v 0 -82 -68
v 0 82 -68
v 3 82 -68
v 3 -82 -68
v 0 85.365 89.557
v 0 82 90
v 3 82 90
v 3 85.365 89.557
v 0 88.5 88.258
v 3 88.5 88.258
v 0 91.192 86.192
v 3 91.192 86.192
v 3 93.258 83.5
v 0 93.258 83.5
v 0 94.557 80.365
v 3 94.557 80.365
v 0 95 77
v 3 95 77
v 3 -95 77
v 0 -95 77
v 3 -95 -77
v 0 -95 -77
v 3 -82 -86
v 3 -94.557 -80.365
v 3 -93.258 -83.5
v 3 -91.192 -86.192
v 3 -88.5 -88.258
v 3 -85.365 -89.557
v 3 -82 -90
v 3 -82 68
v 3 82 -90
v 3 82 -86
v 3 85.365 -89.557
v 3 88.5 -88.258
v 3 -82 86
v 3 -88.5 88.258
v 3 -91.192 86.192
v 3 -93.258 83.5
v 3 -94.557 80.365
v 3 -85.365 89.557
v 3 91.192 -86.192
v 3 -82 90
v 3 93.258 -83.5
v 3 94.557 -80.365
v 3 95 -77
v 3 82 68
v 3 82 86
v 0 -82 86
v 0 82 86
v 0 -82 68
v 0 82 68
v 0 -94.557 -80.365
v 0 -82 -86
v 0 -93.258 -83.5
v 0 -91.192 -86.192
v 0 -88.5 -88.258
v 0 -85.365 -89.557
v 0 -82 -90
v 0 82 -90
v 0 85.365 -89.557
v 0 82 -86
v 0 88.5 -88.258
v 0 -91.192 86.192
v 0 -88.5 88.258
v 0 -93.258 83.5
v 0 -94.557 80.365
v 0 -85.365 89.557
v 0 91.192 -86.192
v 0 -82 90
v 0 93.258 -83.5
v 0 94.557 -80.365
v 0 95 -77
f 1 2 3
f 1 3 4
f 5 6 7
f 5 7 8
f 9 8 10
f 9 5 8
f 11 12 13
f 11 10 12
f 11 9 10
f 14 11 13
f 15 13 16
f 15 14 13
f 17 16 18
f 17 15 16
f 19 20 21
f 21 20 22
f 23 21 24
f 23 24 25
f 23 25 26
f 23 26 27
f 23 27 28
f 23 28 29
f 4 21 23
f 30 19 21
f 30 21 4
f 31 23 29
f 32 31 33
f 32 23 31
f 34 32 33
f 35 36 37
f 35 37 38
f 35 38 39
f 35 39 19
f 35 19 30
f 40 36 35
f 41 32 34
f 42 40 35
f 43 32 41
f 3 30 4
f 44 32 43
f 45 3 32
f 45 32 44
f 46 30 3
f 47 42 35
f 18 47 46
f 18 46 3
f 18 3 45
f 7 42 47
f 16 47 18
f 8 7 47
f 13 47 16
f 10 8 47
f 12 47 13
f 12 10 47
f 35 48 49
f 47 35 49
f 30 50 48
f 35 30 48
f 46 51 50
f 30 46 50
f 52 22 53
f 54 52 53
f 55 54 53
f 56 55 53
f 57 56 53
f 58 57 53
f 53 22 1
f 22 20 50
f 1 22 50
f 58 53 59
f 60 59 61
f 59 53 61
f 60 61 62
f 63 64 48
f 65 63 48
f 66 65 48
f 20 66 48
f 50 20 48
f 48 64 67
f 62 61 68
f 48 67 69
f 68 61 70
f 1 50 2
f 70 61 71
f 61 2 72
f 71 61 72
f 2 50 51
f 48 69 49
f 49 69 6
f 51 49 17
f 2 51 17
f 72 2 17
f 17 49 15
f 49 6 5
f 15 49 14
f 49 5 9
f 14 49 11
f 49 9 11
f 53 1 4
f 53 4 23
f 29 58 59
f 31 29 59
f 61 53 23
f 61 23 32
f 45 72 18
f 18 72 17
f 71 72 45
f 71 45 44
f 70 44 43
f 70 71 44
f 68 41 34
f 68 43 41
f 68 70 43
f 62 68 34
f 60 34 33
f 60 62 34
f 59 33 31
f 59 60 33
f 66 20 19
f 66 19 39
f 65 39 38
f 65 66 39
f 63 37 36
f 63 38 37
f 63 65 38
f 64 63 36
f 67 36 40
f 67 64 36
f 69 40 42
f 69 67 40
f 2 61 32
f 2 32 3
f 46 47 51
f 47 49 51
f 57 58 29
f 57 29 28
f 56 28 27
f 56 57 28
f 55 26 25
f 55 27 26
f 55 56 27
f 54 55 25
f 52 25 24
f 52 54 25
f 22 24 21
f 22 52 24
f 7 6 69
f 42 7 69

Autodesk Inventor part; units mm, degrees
ref_plane "YZ Plane" through (0, 0, 0) normal (1, 0, 0) x (0, 1, 0)
sketch "Эскиз1" plane through (0, 0, 0) normal (1, 0, 0) x (0, 1, 0)
  line L0 (95, -77) -> (95, 77)
  line L1 (82, 90) -> (-82, 90)
  line L2 (-95, 77) -> (-95, -77)
  line L3 (-82, -90) -> (82, -90)
  arc A0 (82, -90) -> (95, -77) centre (82, -77) ccw
  arc A1 (-95, -77) -> (-82, -90) centre (-82, -77) ccw
  arc A2 (-82, 90) -> (-95, 77) centre (-82, 77) ccw
  arc A3 (95, 77) -> (82, 90) centre (82, 77) ccw
  line L4 (-82, 90) -> (82, 90)
  line L5 (82, 68) -> (-82, 68)
  line L6 (-82, 68) -> (-82, 86)
  line L7 (-82, 86) -> (82, 86)
  line L8 (-82, -90) -> (82, -90)
  line L9 (82, -86) -> (82, -68)
  line L10 (82, -68) -> (-82, -68)
  line L11 (-82, -68) -> (-82, -86)
  line L12 (-82, -86) -> (82, -86)
  line L13 (82, 86) -> (82, 68)
  line L14 (82, 68) -> (72, 68)
  line L15 (72, 86) -> (82, 86)
  line L16 (-82, 68) -> (-72, 68)
  line L17 (-72, 68) -> (-72, 86)
  line L18 (-72, 86) -> (-82, 86)
  line L19 (-82, 86) -> (-82, 68)
  line L20 (-72, 86) -> (-68.8341, 86)
  line L21 (-68.8341, 86) -> (-68.8341, 84.5)
  line L22 (-68.8341, 84.5) -> (-72, 84.5)
  line L23 (-72, 84.5) -> (-72, 86)
  line L24 (-72, 84.5) -> (-12, 84.5)
  line L25 (-12, 84.5) -> (-12, 69.5)
  line L26 (-12, 69.5) -> (-72, 69.5)
  line L27 (-72, 69.5) -> (-72, 84.5)
  line L28 (82, 86) -> (72, 86)
  line L29 (72, 86) -> (72, 68)
  line L30 (72, 68) -> (82, 68)
  line L31 (82, 68) -> (82, 86)
  line L32 (72, 84.5) -> (12, 84.5)
  line L33 (12, 84.5) -> (12, 69.5)
  line L34 (12, 69.5) -> (72, 69.5)
  line L35 (72, 69.5) -> (72, 84.5)
  line L36 (-42, 68) -> (-54.5, 68)
  line L37 (-54.5, 8) -> (-29.5, 8)
  line L38 (-29.5, 8) -> (-29.5, 68)
  line L39 (-29.5, 68) -> (-54.5, 68)
  line L40 (-54.5, 68) -> (-54.5, 8)
  point P0 (0, 0)
  point P1 (-95, 90)
  point P2 (95, 90)
  point P3 (-95, -90)
  dimension "d6" = 180
  dimension "d7" = 190
  dimension "d8" = 13
  dimension "d9" = 13
  dimension "d11" = 18
  dimension "d19" = 10
  dimension "d20" = 1.5
  dimension "d21" = 60
  dimension "d22" = 15
  dimension "d23" = 10
  dimension "d24" = 60
  dimension "d26" = 60
  dimension "d27" = 25
extrude "Выдавливание1" add sketch "Эскиз1" along normal blind 3 contours A0 L3 A1 L2 A2 L1 A3 L0 | L38 L37 L40 L5
properties part number "основа_прототип"
